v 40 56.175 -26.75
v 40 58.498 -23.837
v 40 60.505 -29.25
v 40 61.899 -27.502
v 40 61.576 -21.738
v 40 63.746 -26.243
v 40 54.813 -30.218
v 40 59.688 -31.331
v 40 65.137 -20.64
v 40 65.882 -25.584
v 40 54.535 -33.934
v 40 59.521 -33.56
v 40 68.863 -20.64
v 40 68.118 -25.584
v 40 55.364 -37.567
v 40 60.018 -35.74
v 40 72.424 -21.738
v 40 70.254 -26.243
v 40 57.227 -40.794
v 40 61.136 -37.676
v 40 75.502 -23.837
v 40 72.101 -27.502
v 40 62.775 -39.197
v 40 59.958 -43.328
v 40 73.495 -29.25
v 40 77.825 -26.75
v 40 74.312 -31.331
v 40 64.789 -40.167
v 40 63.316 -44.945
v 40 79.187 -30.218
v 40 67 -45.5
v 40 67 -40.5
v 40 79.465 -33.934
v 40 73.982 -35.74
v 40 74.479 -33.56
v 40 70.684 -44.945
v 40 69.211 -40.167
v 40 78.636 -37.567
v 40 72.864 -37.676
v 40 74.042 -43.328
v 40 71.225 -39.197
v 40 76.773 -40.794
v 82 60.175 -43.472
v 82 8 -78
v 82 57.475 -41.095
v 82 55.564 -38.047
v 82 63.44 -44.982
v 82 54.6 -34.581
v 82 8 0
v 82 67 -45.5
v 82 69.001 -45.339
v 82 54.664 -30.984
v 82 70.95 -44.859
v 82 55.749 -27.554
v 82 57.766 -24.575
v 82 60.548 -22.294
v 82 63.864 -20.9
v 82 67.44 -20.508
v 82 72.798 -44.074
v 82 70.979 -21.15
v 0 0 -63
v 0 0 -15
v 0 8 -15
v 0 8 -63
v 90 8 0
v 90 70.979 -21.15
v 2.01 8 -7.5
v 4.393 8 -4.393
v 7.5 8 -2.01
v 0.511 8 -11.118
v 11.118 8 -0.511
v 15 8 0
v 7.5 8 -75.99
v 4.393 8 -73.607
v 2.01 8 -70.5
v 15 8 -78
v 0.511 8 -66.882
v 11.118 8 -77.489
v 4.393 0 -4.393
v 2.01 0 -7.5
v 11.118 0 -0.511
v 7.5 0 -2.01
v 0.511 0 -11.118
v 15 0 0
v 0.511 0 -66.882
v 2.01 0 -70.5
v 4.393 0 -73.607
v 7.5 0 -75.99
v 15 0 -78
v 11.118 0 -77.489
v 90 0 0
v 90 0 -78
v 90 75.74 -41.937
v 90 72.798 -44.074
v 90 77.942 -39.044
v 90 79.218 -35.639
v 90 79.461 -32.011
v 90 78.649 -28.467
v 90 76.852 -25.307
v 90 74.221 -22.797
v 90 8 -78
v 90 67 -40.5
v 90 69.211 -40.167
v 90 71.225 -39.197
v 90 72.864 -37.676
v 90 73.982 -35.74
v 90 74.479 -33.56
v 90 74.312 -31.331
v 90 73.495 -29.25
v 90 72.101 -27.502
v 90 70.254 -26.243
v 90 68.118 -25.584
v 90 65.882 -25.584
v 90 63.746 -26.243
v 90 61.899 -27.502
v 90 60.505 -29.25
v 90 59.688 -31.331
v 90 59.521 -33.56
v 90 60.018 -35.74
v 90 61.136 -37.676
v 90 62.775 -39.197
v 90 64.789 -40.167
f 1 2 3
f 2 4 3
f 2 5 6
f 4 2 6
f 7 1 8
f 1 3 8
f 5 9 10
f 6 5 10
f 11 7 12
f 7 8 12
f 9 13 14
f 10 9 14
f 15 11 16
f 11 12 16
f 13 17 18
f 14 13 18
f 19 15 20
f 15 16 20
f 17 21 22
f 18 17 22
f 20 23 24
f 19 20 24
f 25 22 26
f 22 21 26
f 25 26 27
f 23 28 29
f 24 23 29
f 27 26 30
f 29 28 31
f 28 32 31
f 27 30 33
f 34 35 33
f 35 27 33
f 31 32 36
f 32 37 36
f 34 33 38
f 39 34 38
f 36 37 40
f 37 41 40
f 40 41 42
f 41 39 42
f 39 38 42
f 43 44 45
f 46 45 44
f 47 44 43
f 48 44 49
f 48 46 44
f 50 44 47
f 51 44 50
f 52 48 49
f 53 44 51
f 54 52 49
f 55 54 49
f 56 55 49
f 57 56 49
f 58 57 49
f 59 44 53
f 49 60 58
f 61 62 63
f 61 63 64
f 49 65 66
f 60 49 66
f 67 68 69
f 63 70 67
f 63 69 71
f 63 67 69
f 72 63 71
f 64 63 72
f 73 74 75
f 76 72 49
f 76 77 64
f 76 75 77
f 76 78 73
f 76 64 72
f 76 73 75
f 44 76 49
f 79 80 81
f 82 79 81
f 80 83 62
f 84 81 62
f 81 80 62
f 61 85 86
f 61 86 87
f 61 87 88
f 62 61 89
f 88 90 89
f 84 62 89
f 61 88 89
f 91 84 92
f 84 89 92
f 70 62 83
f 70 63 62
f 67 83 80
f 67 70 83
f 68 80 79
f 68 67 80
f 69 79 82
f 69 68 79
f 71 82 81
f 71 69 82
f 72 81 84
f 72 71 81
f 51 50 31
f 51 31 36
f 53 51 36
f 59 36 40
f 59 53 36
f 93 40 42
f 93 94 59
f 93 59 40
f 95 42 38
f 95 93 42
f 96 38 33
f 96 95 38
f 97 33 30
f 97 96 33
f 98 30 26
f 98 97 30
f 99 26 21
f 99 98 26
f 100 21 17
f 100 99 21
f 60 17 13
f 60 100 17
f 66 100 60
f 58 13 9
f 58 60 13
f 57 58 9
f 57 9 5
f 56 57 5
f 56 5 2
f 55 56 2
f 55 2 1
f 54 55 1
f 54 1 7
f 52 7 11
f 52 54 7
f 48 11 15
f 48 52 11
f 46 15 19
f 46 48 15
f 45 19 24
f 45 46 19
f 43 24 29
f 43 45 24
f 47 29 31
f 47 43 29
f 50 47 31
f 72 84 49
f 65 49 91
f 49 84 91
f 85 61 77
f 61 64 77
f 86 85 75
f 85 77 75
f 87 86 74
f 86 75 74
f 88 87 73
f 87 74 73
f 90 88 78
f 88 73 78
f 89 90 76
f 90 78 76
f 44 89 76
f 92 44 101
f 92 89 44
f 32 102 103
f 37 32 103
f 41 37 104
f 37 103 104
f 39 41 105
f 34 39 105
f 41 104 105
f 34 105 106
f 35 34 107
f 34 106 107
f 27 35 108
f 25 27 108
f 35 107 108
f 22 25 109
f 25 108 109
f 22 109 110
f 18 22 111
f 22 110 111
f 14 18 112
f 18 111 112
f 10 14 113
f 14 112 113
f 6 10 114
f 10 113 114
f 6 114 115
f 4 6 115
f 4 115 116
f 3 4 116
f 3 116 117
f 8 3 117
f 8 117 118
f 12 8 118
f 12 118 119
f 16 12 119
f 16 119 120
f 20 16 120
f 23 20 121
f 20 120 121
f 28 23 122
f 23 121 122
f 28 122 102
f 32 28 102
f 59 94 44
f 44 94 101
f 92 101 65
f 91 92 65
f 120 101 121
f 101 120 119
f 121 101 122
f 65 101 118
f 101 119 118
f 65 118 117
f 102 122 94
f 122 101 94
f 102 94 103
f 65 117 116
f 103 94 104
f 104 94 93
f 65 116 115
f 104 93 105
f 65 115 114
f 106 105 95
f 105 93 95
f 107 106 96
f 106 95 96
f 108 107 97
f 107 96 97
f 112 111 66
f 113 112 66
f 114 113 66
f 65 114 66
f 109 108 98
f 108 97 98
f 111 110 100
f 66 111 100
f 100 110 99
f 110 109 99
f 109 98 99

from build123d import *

# Parameters (mm, degrees)
SKETCH2_W           = 90
SKETCH2_H           = 78
BOSS_EXTRUDE1_DEPTH = 8
SKETCH3_R           = 12.5
SKETCH3_R_2         = 7.5
BOSS_EXTRUDE2_DEPTH = 50
BOSS_EXTRUDE3_DEPTH = 8
FILLET1_R           = 15
FILLET2_R           = 15


with BuildPart() as part:
    # Sketch2 → Boss-Extrude1 (new body)
    with BuildSketch(Plane(origin=(0, 0, 0), x_dir=(1, 0, 0), z_dir=(0, 1, 0))):
        with Locations((45, 39)):
            Rectangle(SKETCH2_W, SKETCH2_H)
    extrude(amount=BOSS_EXTRUDE1_DEPTH)



with BuildPart() as body_2:
    # Sketch3 → Boss-Extrude2 (new body)
    with BuildSketch(Plane(origin=(90, 0, 0), x_dir=(0, 0, -1), z_dir=(1, 0, 0))):
        with Locations((33, 67)):
            Circle(SKETCH3_R)
        with Locations((33, 67)):
            Circle(SKETCH3_R_2, mode=Mode.SUBTRACT)
    extrude(amount=-BOSS_EXTRUDE2_DEPTH)


with BuildPart() as part_1:
    add(part.part)

    add(body_2.part)  # Boss-Extrude3 merges body 2
    # Sketch4 → Boss-Extrude3 (add)
    with BuildSketch(Plane(origin=(90, 0, 0), x_dir=(0, 0, -1), z_dir=(1, 0, 0))):
        with BuildLine():
            Line((44.074003649, 72.797968885), (78, 8))
            Line((78, 8), (0, 8))
            Line((0, 8), (21.150362392, 70.979458323))
            ThreePointArc((21.150362392, 70.979458323), (33.988507549, 54.539147187), (44.074003649, 72.797968885))
        make_face()
    extrude(amount=-BOSS_EXTRUDE3_DEPTH)

    # Fillet1
    fillet1_edges = [part_1.edges().sort_by_distance(p)[0] for p in [
        (0, 4, 0),
    ]]
    fillet(fillet1_edges, radius=FILLET1_R)

    # Fillet2
    fillet2_edges = [part_1.edges().sort_by_distance(p)[0] for p in [
        (0, 4, -78),
    ]]
    fillet(fillet2_edges, radius=FILLET2_R)


solid = part_1.part
